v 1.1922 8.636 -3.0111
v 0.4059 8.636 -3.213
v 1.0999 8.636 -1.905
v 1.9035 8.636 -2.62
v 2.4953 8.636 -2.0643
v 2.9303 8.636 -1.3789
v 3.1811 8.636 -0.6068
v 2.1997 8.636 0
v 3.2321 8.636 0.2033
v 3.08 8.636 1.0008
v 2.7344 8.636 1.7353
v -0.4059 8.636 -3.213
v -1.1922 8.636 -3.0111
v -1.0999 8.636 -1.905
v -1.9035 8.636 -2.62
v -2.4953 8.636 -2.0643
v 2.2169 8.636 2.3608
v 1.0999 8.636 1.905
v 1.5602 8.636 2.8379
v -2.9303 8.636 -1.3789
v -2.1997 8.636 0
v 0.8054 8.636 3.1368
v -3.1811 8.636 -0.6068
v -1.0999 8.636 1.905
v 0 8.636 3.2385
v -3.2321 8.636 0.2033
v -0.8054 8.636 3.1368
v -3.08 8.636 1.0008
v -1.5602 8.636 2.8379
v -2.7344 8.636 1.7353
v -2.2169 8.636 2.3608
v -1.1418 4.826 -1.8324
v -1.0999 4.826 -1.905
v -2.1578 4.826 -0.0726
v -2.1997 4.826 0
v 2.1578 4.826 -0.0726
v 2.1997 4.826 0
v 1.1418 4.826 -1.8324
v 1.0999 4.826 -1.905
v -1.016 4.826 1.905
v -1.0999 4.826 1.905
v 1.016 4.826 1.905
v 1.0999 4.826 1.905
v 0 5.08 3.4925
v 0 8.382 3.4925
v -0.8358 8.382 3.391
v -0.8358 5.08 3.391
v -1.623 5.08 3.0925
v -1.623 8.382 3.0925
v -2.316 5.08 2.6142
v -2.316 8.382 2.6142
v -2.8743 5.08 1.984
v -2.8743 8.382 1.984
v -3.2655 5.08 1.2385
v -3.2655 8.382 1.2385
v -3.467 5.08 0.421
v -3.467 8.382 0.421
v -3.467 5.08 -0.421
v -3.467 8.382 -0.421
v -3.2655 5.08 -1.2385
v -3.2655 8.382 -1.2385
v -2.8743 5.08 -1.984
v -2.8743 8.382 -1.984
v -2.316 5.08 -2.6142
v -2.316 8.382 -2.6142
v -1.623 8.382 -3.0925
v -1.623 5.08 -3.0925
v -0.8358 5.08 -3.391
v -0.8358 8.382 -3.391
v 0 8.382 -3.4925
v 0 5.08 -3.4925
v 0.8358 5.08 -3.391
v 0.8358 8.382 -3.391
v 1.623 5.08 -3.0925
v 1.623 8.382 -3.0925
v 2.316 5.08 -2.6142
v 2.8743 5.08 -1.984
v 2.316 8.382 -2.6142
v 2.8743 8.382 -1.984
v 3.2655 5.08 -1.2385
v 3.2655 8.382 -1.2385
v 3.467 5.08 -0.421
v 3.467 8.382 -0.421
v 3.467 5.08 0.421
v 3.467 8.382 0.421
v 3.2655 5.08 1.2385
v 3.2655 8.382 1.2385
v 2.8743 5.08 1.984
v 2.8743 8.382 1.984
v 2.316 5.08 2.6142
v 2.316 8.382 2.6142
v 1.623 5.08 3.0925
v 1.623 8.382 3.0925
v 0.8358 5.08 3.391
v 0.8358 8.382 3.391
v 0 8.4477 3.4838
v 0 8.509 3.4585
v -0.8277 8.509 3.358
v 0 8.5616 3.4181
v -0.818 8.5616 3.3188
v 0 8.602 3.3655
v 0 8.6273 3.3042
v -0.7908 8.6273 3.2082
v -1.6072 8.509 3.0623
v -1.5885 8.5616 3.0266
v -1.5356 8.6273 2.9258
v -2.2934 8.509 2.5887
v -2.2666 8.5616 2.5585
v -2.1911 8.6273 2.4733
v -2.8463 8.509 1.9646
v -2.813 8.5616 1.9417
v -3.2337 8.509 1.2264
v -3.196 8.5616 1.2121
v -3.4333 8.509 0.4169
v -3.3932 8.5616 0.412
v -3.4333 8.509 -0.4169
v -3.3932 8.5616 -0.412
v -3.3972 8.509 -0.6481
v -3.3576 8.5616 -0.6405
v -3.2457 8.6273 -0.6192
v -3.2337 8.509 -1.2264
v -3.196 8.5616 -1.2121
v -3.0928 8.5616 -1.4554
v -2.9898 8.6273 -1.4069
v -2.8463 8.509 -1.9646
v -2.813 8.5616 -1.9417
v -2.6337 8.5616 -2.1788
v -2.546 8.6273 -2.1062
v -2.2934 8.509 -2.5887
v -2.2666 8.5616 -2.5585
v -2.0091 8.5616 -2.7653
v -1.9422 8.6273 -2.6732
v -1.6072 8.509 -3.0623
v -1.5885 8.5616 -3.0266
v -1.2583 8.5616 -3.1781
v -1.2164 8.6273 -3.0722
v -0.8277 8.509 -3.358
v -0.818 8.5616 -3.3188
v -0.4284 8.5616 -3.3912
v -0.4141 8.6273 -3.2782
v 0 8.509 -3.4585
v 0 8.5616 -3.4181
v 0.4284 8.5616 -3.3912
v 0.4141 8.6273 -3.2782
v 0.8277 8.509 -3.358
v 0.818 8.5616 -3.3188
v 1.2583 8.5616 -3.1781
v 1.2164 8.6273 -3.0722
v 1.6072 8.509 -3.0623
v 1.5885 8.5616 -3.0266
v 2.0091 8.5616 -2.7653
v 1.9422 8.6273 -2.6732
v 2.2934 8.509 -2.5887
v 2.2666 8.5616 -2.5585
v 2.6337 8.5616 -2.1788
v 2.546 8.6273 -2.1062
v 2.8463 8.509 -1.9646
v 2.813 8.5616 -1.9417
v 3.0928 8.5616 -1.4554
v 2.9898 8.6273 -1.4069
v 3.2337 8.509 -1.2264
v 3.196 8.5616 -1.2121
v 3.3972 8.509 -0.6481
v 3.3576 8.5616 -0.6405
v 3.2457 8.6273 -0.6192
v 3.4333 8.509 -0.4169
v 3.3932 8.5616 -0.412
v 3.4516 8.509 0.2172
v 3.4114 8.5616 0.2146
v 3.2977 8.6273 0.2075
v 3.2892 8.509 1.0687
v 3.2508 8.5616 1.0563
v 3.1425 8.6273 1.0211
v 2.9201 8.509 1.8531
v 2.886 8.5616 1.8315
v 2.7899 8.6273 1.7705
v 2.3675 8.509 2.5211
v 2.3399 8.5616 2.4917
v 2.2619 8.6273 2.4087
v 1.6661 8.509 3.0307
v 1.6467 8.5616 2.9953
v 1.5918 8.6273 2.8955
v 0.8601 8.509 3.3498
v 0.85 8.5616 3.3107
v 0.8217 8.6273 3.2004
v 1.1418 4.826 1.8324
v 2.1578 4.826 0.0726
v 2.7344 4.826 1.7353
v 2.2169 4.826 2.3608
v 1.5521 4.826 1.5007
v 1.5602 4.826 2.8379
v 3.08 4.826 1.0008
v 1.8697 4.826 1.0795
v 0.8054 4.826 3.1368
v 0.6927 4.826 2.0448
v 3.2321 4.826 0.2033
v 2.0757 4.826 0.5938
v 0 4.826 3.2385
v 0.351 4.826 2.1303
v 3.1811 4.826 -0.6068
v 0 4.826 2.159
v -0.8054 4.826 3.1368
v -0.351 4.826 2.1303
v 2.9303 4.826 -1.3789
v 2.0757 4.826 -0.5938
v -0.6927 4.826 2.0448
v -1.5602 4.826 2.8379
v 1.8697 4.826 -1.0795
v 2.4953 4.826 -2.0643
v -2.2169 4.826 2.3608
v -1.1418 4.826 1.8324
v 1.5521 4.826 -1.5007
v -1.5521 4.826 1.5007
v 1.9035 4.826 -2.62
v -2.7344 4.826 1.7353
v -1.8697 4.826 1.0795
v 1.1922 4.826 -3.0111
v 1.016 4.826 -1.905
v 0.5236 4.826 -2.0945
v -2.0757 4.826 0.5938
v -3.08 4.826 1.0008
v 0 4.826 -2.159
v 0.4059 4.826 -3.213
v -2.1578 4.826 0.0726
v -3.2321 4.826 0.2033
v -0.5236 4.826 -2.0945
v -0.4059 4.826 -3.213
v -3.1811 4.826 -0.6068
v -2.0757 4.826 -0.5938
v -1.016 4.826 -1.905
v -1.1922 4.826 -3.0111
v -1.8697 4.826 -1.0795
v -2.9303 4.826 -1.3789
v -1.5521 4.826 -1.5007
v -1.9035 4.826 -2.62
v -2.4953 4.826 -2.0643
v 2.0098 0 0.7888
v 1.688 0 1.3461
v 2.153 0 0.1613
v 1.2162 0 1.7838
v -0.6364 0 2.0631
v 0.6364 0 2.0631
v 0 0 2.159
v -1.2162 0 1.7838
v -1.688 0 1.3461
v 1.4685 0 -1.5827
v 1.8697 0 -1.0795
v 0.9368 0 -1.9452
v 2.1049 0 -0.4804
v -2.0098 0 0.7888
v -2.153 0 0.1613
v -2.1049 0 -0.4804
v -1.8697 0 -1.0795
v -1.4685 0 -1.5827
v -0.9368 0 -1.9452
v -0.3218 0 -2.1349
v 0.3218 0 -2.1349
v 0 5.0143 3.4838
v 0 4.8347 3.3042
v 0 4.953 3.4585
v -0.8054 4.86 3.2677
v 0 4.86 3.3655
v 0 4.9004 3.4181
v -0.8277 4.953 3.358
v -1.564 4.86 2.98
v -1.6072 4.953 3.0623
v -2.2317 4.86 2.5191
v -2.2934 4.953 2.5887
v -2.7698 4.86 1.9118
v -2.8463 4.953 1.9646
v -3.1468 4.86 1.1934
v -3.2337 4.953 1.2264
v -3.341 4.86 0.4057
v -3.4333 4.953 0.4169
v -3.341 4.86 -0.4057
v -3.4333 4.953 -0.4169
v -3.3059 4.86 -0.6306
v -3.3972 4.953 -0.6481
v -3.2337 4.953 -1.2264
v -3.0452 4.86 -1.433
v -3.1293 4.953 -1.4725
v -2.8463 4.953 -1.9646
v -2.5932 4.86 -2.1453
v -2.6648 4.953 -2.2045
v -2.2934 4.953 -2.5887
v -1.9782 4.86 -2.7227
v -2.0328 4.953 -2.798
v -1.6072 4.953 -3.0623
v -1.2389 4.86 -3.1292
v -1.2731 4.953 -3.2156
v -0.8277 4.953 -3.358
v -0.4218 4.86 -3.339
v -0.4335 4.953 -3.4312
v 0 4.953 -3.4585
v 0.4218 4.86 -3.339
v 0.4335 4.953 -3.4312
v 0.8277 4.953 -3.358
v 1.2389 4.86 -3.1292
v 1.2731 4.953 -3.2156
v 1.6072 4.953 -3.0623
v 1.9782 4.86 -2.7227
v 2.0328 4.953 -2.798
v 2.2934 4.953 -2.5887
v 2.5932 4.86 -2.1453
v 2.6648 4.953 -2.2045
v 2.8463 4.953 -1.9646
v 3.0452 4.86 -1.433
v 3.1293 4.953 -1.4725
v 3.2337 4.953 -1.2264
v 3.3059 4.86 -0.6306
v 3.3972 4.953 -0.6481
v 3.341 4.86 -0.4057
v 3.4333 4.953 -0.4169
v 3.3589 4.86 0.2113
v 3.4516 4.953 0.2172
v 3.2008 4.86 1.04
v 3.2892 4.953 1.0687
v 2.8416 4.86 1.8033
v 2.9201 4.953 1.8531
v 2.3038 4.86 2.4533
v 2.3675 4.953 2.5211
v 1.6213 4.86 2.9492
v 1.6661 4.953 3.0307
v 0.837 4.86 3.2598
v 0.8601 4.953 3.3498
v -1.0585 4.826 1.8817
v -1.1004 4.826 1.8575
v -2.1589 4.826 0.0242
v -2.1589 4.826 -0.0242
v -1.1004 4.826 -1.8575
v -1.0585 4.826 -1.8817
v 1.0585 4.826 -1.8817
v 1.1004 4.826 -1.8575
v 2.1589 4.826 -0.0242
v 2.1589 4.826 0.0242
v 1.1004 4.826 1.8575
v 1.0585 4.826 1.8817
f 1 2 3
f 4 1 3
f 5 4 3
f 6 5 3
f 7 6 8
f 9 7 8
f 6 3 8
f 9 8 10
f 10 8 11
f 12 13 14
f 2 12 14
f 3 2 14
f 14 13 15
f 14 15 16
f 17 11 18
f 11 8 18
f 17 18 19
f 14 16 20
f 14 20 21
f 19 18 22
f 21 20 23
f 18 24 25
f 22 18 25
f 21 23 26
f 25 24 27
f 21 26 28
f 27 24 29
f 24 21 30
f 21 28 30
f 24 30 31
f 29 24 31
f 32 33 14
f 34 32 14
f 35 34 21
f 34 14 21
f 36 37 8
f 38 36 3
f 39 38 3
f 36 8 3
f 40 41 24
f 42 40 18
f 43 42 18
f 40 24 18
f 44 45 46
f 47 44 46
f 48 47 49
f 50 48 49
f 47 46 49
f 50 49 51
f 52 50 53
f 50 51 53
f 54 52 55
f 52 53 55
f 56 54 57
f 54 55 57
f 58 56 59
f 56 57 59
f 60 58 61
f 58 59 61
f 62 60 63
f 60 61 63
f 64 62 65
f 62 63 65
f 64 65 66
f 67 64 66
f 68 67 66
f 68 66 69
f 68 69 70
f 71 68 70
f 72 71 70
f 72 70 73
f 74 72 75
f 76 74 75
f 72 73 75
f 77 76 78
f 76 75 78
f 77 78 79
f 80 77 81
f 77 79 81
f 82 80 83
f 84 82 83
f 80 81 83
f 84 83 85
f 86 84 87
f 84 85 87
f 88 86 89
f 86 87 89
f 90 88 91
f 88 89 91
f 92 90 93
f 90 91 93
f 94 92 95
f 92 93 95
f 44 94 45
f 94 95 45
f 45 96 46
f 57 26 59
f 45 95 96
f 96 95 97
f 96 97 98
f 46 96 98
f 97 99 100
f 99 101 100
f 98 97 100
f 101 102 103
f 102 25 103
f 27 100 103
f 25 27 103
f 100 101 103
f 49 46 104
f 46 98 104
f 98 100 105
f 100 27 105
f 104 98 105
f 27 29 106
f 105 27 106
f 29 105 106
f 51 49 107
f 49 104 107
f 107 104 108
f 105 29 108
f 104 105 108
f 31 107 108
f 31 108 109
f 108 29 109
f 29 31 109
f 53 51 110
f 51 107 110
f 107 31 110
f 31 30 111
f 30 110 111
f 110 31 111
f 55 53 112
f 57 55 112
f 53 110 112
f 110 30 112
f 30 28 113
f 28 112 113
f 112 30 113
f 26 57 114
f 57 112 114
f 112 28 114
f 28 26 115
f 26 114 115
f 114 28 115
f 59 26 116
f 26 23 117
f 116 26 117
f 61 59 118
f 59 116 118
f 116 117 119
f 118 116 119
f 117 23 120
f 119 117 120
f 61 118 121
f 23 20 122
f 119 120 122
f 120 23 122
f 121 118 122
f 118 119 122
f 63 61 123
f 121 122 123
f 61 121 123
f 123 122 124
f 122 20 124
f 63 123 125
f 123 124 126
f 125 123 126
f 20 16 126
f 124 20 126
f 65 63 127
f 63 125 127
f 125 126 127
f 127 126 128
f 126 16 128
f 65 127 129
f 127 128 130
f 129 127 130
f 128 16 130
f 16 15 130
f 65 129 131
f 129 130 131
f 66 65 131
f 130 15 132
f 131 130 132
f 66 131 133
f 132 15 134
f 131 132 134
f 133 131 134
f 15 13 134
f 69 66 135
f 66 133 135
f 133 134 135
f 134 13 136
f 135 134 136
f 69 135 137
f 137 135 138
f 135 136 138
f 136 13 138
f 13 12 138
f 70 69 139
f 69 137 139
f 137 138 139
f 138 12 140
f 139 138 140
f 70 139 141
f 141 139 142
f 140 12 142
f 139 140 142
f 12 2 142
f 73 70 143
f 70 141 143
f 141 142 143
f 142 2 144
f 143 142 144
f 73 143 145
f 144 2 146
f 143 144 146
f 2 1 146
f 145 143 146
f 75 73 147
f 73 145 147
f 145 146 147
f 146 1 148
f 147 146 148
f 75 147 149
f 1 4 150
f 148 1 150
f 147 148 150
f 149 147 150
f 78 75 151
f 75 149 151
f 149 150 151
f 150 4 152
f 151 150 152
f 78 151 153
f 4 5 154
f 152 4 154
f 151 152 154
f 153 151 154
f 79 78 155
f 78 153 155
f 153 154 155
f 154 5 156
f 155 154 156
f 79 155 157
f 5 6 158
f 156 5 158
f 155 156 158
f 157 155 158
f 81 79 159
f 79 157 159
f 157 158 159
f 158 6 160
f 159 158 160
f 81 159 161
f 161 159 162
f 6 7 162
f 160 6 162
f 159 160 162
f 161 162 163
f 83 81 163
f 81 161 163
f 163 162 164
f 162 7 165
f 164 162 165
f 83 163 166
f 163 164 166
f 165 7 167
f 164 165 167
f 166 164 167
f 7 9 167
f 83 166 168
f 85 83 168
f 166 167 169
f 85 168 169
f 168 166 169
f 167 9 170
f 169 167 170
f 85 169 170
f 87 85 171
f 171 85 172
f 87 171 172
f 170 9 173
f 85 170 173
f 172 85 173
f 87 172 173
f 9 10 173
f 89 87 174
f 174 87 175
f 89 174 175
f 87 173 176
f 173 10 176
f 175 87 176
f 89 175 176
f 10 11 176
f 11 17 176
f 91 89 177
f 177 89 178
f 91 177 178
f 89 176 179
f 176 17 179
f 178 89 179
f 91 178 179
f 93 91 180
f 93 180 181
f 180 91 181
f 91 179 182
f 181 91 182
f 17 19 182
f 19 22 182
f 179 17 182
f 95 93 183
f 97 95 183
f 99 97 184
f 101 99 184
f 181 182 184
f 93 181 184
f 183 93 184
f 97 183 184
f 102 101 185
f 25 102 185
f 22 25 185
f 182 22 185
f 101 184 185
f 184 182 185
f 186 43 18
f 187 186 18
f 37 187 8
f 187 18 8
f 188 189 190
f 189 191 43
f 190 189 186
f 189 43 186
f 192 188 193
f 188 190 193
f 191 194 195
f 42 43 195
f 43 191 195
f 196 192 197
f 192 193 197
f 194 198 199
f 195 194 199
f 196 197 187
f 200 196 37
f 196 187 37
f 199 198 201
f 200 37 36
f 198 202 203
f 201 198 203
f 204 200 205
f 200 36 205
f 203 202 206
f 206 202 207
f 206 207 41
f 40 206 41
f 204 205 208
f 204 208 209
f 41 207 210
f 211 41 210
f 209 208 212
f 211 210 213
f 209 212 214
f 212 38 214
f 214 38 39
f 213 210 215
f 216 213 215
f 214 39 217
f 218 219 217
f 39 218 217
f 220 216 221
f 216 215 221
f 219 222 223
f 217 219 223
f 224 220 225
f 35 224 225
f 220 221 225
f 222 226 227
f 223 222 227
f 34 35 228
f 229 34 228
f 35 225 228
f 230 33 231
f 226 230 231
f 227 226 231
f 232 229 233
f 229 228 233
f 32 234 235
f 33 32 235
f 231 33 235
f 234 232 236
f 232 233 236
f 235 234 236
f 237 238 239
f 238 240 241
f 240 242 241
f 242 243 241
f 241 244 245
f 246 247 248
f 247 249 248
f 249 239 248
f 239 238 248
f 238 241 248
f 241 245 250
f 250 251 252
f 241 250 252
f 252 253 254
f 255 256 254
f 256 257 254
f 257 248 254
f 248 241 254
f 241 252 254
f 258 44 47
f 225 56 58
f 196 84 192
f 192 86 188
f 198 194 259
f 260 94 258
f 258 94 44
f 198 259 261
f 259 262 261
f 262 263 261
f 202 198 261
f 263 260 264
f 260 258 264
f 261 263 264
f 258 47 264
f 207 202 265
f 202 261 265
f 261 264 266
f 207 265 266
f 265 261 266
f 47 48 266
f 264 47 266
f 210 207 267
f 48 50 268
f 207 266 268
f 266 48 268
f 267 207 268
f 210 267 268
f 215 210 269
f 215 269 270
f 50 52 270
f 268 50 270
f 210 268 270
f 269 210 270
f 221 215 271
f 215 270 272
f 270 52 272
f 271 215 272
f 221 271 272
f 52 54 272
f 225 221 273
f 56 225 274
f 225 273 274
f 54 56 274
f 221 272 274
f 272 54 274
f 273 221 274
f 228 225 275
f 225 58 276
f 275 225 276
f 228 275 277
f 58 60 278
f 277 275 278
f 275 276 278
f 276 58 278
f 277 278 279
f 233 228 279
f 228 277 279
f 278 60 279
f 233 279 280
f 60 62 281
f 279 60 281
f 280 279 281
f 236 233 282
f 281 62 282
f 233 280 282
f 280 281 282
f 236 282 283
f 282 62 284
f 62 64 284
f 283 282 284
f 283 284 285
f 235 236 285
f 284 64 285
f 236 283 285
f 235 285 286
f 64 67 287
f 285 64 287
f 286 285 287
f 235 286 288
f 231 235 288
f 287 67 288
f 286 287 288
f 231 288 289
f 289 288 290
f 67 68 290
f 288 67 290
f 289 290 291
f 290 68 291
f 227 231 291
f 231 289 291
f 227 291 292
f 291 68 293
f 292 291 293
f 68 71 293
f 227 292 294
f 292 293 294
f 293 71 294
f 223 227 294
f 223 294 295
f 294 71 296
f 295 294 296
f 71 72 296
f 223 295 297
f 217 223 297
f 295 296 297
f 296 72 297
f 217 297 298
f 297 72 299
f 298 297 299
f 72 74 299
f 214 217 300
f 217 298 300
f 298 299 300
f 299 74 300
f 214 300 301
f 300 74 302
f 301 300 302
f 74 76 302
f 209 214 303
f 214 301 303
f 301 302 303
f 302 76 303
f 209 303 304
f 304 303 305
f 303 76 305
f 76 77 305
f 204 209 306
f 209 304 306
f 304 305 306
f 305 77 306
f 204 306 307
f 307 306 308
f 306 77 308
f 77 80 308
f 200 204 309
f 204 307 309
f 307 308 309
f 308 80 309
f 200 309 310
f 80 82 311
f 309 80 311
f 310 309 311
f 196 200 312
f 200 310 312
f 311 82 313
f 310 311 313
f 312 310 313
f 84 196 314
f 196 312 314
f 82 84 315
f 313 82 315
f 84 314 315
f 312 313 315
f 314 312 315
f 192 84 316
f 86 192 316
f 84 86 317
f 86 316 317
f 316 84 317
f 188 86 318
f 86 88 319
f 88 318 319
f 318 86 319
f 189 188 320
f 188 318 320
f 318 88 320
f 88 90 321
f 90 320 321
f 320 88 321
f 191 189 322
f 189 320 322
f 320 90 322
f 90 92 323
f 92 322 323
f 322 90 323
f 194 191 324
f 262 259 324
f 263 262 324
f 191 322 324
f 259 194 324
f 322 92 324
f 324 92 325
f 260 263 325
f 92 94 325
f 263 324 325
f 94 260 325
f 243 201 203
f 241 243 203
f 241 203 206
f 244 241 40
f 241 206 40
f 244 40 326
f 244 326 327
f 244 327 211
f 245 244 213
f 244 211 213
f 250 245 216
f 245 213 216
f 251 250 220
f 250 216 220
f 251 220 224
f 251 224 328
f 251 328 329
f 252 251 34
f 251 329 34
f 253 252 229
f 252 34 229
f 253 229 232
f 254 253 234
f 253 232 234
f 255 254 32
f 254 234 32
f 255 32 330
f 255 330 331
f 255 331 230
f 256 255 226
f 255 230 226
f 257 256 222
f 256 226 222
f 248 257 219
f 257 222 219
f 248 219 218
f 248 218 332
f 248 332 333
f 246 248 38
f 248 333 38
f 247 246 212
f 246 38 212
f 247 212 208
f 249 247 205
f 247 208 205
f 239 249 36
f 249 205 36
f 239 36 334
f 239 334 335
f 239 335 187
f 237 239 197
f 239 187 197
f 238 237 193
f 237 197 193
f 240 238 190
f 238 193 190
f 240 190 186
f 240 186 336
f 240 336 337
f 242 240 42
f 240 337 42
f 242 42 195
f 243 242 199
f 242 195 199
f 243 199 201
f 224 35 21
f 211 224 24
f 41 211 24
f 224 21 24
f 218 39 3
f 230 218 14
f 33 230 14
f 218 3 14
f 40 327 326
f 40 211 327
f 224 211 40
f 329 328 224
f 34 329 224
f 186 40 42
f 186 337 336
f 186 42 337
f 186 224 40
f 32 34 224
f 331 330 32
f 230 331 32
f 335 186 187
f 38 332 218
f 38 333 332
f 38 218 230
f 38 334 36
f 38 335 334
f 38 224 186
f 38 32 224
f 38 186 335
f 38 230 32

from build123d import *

# Parameters (mm, degrees)
FILLET1_R          = 0.254
CUT_EXTRUDE1_DEPTH = 3.81


with BuildPart() as part:
    # Sketch1 → Revolve1 (revolve)
    with BuildSketch(Plane.XY, mode=Mode.PRIVATE) as revolve1_sk:
        Polygon((2.159, 0), (2.159, 4.826), (3.4925, 4.826), (3.4925, 8.636), (0, 8.636), (0, 0), align=None)
    revolve(revolve1_sk.sketch.rotate(Axis((0, 0, 0), (0, -1, 0)), 90), axis=Axis((0, 0, 0), (0, -1, 0)))

    # Fillet1
    fillet1_edges = [part.edges().sort_by_distance(p)[0] for p in [
        (0, 8.636, -3.4925),
        (0, 4.826, -3.4925),
    ]]
    fillet(fillet1_edges, radius=FILLET1_R)

    # Sketch2 → Cut-Extrude1 (cut)
    with BuildSketch(Plane(origin=(0, 8.636, 0), x_dir=(1, 0, 0), z_dir=(0, 1, 0))):
        Polygon((1.099852263, 1.905), (-1.099852263, 1.905), (-2.199704526, 0), (-1.099852263, -1.905), (1.099852263, -1.905), (2.199704526, 0), align=None)
    extrude(amount=-CUT_EXTRUDE1_DEPTH, mode=Mode.SUBTRACT)


solid = part.part
